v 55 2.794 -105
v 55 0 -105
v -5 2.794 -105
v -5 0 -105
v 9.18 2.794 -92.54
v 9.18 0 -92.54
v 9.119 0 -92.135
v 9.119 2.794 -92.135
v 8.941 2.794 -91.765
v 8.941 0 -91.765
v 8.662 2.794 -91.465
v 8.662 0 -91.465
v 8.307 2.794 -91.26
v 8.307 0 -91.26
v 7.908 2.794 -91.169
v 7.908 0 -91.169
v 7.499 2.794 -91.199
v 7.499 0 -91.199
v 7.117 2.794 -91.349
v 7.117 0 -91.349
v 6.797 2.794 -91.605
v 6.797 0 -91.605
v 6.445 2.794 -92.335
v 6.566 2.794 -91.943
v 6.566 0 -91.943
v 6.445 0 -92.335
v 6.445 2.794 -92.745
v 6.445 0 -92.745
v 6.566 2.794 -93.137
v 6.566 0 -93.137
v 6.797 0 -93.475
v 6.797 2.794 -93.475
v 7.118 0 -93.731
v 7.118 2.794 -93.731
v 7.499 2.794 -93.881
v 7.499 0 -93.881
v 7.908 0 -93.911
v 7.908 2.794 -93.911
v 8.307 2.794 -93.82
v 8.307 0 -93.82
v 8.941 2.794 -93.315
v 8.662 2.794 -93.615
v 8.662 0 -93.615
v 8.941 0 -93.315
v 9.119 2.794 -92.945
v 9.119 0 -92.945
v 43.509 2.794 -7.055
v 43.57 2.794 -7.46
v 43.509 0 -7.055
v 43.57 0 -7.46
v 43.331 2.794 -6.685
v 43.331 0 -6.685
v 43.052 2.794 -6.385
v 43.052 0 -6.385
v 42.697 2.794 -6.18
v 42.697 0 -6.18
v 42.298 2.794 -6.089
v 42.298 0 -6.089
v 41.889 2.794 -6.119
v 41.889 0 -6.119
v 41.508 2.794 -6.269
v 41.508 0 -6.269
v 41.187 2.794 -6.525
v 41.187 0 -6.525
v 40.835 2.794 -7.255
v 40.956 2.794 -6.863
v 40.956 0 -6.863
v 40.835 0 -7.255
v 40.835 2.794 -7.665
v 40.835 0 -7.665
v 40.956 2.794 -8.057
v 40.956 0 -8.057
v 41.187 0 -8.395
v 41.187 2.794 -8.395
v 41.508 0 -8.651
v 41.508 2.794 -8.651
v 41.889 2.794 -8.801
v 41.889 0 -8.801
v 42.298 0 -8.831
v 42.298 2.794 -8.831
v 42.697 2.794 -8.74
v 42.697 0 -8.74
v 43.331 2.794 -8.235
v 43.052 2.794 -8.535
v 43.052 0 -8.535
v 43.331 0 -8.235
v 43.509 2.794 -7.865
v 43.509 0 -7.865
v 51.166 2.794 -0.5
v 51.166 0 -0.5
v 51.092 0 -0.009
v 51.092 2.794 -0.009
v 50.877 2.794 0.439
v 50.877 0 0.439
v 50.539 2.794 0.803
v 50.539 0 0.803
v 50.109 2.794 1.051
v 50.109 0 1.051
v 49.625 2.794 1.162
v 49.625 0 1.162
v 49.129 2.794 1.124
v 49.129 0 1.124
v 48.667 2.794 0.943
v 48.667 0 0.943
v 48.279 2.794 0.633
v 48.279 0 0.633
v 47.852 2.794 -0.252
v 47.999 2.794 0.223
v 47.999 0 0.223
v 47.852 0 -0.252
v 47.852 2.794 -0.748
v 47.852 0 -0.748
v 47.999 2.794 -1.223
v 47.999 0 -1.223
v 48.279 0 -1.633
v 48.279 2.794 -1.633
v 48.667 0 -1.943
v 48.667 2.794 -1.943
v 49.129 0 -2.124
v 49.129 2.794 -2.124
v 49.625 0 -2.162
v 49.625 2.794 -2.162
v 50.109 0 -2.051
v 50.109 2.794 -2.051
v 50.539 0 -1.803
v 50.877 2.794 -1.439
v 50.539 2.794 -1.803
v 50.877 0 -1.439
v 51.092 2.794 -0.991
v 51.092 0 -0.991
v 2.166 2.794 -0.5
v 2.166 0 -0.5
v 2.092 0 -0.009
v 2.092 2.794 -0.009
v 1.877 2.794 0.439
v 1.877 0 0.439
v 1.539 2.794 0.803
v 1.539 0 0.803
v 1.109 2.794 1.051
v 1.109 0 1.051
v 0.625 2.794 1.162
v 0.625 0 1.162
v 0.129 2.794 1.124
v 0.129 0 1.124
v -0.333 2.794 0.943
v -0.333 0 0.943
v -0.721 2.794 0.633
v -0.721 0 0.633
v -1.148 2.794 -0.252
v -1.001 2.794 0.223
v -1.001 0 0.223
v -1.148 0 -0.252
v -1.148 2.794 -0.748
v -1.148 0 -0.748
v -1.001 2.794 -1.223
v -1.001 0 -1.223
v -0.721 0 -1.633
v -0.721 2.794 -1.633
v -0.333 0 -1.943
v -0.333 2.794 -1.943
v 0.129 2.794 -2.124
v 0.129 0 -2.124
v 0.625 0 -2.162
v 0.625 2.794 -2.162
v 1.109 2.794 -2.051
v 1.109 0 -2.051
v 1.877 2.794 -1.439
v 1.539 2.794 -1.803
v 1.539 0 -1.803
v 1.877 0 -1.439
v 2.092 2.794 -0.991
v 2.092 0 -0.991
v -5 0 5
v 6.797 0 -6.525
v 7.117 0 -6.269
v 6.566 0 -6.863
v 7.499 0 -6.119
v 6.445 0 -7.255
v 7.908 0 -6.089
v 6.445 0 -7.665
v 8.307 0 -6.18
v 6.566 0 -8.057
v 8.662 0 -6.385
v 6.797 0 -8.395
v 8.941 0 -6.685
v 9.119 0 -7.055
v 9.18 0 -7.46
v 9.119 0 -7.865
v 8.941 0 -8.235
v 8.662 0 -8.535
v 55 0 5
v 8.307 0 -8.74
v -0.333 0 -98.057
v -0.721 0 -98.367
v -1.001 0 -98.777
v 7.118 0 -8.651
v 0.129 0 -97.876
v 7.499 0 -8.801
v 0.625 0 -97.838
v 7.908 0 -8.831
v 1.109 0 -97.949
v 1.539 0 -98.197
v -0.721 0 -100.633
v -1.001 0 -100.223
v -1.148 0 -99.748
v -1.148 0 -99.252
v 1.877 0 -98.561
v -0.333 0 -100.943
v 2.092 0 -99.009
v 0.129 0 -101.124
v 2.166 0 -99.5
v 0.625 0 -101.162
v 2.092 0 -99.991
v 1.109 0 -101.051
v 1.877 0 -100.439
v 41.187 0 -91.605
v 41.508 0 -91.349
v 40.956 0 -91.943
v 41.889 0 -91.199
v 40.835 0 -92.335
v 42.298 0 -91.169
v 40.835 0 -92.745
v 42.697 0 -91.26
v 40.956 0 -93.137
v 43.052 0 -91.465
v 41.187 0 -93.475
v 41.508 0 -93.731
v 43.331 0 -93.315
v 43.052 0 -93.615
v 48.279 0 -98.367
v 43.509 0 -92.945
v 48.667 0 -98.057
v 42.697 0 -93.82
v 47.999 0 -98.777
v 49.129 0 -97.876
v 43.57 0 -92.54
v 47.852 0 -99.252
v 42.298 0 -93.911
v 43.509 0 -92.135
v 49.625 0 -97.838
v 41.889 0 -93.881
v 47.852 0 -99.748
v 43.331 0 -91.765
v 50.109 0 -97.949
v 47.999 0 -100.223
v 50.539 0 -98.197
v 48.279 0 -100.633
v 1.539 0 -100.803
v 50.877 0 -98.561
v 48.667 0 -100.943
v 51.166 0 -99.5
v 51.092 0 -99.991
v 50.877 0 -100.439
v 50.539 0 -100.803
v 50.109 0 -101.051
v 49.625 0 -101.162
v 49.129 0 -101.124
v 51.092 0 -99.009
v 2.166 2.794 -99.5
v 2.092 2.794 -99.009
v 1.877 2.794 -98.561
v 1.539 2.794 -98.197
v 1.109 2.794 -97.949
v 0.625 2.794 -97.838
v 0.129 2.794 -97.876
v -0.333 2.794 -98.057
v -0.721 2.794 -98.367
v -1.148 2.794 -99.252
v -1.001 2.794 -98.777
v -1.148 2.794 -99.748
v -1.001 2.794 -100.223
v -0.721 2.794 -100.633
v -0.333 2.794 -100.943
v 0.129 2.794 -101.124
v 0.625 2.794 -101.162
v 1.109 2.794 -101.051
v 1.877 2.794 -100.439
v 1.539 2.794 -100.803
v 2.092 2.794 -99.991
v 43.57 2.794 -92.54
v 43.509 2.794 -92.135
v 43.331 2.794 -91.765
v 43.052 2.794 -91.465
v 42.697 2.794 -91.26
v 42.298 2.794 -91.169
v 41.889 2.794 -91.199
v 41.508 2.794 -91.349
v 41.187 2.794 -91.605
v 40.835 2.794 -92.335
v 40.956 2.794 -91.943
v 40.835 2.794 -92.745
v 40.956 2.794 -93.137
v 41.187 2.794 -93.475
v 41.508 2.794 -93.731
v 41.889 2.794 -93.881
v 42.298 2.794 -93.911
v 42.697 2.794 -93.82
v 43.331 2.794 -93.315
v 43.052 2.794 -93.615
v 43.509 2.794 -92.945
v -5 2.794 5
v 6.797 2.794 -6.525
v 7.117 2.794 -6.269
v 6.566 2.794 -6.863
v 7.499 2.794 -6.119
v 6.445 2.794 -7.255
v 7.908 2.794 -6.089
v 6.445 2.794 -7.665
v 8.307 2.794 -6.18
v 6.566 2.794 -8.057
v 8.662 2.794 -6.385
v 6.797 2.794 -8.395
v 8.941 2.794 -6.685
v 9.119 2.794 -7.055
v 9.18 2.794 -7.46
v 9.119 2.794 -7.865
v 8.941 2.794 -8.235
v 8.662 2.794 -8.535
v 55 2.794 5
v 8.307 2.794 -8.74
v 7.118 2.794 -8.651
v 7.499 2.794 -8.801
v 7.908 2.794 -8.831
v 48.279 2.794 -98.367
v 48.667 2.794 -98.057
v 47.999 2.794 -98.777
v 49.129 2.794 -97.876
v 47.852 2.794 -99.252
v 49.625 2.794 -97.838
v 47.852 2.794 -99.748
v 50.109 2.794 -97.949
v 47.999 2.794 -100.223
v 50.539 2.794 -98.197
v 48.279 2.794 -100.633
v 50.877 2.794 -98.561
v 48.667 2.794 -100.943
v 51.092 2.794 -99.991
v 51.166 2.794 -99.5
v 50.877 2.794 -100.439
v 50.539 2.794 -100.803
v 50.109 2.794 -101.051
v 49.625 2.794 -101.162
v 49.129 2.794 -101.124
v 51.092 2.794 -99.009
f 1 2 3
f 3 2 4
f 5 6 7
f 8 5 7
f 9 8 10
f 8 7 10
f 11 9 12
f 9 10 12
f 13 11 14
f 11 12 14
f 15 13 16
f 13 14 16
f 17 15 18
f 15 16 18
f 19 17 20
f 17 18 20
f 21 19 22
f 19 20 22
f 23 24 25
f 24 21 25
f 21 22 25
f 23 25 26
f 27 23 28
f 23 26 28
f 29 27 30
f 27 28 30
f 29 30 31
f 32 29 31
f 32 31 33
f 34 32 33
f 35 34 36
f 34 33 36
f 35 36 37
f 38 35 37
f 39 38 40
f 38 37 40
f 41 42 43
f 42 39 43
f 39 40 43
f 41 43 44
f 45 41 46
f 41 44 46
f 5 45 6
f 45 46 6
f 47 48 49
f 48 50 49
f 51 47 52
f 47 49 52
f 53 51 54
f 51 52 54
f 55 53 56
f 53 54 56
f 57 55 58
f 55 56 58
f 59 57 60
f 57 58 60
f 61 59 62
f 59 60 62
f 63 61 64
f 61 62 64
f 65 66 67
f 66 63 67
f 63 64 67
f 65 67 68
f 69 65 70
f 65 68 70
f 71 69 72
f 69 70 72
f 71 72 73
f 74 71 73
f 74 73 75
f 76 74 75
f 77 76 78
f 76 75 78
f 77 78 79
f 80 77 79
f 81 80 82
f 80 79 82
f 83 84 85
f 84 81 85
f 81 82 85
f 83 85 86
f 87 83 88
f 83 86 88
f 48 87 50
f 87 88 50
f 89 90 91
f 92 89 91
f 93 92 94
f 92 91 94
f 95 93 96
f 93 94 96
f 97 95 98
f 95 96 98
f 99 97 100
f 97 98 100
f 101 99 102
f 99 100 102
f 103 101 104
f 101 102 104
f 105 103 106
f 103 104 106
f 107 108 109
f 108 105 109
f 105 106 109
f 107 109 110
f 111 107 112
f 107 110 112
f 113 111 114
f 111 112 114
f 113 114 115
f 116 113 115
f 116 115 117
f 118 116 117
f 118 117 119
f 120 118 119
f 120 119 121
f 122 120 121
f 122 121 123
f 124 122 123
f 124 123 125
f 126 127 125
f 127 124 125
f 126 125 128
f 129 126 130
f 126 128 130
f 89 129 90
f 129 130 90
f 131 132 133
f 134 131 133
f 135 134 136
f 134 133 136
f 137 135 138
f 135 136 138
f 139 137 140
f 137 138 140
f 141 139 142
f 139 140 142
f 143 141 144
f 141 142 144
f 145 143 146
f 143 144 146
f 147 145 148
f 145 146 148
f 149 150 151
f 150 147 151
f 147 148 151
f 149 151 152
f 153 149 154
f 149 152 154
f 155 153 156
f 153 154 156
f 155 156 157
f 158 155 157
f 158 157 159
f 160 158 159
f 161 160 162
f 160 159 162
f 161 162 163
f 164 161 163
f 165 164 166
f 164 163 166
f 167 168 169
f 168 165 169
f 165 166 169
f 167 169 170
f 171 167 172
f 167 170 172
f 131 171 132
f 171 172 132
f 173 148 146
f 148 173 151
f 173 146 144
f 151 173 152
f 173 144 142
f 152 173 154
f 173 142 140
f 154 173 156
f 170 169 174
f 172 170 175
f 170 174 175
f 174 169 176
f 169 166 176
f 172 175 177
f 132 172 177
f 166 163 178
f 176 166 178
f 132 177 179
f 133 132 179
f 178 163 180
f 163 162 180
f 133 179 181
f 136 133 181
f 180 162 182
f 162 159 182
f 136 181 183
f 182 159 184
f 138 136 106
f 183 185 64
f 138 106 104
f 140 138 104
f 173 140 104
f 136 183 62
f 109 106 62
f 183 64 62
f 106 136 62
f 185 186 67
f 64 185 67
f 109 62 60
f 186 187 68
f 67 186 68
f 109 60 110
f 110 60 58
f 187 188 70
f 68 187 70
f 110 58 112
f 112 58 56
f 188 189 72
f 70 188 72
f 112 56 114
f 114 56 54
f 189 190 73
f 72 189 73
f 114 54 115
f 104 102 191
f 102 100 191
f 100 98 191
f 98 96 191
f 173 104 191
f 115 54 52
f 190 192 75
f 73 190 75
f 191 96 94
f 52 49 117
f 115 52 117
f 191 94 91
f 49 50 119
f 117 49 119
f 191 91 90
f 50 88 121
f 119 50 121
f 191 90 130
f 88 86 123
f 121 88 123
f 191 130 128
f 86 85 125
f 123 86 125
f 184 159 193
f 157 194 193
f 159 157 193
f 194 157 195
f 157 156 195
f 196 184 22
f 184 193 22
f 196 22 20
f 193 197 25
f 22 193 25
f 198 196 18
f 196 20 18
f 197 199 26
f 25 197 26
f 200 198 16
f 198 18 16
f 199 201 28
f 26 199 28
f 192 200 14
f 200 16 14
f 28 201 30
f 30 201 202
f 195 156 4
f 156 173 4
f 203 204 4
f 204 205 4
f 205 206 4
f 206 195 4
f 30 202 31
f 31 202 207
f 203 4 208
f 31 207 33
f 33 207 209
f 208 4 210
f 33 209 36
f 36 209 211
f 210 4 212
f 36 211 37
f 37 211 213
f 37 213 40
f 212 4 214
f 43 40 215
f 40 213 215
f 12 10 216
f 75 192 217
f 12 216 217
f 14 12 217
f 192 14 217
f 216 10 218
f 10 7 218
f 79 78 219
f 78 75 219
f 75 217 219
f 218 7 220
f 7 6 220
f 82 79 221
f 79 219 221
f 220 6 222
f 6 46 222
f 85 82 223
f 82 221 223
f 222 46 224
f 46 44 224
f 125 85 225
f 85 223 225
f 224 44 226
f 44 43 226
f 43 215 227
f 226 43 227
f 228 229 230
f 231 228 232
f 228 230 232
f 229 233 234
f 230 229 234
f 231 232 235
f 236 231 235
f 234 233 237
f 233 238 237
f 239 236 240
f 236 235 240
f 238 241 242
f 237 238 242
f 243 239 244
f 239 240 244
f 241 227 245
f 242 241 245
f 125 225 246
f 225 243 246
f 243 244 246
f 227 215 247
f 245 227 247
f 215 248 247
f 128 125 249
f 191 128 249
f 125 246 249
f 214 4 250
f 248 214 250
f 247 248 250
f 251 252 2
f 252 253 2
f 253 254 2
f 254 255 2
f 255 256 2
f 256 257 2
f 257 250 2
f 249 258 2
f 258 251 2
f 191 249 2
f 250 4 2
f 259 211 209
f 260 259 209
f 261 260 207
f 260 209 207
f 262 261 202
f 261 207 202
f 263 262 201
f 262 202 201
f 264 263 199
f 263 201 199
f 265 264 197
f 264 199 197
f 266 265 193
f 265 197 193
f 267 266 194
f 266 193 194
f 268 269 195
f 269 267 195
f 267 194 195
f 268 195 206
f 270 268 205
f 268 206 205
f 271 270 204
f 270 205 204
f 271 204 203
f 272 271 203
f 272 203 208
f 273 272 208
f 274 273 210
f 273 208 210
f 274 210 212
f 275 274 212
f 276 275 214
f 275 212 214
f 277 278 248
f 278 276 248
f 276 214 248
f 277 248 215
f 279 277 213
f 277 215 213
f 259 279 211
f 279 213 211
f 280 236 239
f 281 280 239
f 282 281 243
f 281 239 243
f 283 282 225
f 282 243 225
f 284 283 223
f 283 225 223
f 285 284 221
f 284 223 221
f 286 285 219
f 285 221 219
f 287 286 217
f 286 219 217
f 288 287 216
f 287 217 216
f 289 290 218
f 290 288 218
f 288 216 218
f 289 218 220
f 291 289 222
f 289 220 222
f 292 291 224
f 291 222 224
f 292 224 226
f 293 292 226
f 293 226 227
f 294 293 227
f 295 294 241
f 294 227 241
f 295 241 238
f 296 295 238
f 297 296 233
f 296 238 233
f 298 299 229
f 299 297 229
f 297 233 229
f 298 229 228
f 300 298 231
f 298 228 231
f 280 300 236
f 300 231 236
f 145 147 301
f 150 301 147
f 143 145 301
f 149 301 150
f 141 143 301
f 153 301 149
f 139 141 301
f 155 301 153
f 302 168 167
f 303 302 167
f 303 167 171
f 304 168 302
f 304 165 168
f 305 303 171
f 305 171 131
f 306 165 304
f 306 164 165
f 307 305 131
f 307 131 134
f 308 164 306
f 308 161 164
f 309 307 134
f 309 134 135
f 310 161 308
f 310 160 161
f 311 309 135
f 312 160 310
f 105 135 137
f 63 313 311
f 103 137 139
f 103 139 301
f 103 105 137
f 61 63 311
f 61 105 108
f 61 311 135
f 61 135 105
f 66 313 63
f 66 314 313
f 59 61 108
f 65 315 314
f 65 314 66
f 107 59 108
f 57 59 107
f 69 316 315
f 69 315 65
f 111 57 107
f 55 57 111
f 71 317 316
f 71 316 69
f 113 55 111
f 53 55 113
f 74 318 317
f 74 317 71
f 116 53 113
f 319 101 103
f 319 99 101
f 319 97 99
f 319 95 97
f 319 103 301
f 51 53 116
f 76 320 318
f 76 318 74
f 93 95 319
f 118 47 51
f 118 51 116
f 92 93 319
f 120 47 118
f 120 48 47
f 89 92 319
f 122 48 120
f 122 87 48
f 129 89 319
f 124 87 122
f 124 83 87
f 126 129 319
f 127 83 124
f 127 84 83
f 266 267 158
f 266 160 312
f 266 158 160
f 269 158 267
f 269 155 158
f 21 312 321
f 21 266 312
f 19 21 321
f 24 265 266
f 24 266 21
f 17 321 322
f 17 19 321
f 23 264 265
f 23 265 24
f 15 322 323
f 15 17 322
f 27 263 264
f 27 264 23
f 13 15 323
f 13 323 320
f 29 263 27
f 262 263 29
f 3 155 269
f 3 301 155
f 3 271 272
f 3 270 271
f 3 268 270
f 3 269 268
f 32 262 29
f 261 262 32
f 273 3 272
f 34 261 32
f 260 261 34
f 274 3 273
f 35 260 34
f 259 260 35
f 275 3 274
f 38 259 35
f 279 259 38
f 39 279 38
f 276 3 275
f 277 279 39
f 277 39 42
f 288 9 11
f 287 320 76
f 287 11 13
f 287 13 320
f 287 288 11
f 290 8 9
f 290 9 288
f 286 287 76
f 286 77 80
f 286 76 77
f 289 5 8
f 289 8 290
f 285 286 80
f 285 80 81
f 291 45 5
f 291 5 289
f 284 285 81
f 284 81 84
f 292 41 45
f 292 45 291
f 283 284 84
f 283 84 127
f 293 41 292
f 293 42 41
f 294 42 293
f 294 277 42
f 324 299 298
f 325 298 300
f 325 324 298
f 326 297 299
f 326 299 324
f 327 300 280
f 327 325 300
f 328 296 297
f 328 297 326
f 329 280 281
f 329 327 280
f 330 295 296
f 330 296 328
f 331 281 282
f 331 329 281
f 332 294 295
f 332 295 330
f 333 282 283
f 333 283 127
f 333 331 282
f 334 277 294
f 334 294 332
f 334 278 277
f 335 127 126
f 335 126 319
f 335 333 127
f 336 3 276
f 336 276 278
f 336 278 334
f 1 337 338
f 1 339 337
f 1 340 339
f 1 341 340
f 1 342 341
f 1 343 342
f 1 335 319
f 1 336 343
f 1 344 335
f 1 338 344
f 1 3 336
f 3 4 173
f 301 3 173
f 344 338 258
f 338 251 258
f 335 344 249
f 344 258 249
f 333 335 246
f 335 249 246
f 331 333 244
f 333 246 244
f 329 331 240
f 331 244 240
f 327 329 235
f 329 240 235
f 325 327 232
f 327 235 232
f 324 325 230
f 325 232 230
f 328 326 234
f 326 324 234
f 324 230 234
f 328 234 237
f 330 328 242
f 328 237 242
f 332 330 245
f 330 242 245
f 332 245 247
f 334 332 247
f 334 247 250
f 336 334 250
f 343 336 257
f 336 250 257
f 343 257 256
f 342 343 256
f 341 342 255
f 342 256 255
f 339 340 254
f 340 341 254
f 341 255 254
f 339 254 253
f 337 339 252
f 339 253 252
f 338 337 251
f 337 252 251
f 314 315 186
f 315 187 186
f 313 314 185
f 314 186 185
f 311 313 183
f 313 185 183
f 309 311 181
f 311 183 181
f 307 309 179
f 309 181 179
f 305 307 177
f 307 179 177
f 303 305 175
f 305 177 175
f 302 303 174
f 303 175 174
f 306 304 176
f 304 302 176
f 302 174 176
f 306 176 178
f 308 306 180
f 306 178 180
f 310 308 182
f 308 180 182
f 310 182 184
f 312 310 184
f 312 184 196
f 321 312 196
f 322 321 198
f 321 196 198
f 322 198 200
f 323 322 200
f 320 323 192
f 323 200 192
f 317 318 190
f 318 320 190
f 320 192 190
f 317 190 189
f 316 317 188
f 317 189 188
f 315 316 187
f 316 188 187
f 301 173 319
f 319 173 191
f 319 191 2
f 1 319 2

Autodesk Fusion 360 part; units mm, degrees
sketch "Sketch1" plane through (0, 0, 0) normal (0, 1, 0) x (1, 0, 0)
  circle A0 centre (0.5, 99.5) radius 1.6662
  circle A1 centre (7.805, 92.54) radius 1.375
  circle A2 centre (42.195, 92.54) radius 1.375
  circle A3 centre (49.5, 99.5) radius 1.6662
  circle A4 centre (7.805, 7.46) radius 1.375
  circle A5 centre (0.5, 0.5) radius 1.6662
  circle A6 centre (42.195, 7.46) radius 1.375
  circle A7 centre (49.5, 0.5) radius 1.6662
  line L0 (-5, -5) -> (55, -5)
  line L1 (55, -5) -> (55, 105)
  line L2 (55, 105) -> (-5, 105)
  line L3 (-5, 105) -> (-5, -5)
  dimension "d5" = 3.3325
  dimension "d8" = 2.75
extrude "Extrude1" add sketch "Sketch1" along normal blind 2.794
